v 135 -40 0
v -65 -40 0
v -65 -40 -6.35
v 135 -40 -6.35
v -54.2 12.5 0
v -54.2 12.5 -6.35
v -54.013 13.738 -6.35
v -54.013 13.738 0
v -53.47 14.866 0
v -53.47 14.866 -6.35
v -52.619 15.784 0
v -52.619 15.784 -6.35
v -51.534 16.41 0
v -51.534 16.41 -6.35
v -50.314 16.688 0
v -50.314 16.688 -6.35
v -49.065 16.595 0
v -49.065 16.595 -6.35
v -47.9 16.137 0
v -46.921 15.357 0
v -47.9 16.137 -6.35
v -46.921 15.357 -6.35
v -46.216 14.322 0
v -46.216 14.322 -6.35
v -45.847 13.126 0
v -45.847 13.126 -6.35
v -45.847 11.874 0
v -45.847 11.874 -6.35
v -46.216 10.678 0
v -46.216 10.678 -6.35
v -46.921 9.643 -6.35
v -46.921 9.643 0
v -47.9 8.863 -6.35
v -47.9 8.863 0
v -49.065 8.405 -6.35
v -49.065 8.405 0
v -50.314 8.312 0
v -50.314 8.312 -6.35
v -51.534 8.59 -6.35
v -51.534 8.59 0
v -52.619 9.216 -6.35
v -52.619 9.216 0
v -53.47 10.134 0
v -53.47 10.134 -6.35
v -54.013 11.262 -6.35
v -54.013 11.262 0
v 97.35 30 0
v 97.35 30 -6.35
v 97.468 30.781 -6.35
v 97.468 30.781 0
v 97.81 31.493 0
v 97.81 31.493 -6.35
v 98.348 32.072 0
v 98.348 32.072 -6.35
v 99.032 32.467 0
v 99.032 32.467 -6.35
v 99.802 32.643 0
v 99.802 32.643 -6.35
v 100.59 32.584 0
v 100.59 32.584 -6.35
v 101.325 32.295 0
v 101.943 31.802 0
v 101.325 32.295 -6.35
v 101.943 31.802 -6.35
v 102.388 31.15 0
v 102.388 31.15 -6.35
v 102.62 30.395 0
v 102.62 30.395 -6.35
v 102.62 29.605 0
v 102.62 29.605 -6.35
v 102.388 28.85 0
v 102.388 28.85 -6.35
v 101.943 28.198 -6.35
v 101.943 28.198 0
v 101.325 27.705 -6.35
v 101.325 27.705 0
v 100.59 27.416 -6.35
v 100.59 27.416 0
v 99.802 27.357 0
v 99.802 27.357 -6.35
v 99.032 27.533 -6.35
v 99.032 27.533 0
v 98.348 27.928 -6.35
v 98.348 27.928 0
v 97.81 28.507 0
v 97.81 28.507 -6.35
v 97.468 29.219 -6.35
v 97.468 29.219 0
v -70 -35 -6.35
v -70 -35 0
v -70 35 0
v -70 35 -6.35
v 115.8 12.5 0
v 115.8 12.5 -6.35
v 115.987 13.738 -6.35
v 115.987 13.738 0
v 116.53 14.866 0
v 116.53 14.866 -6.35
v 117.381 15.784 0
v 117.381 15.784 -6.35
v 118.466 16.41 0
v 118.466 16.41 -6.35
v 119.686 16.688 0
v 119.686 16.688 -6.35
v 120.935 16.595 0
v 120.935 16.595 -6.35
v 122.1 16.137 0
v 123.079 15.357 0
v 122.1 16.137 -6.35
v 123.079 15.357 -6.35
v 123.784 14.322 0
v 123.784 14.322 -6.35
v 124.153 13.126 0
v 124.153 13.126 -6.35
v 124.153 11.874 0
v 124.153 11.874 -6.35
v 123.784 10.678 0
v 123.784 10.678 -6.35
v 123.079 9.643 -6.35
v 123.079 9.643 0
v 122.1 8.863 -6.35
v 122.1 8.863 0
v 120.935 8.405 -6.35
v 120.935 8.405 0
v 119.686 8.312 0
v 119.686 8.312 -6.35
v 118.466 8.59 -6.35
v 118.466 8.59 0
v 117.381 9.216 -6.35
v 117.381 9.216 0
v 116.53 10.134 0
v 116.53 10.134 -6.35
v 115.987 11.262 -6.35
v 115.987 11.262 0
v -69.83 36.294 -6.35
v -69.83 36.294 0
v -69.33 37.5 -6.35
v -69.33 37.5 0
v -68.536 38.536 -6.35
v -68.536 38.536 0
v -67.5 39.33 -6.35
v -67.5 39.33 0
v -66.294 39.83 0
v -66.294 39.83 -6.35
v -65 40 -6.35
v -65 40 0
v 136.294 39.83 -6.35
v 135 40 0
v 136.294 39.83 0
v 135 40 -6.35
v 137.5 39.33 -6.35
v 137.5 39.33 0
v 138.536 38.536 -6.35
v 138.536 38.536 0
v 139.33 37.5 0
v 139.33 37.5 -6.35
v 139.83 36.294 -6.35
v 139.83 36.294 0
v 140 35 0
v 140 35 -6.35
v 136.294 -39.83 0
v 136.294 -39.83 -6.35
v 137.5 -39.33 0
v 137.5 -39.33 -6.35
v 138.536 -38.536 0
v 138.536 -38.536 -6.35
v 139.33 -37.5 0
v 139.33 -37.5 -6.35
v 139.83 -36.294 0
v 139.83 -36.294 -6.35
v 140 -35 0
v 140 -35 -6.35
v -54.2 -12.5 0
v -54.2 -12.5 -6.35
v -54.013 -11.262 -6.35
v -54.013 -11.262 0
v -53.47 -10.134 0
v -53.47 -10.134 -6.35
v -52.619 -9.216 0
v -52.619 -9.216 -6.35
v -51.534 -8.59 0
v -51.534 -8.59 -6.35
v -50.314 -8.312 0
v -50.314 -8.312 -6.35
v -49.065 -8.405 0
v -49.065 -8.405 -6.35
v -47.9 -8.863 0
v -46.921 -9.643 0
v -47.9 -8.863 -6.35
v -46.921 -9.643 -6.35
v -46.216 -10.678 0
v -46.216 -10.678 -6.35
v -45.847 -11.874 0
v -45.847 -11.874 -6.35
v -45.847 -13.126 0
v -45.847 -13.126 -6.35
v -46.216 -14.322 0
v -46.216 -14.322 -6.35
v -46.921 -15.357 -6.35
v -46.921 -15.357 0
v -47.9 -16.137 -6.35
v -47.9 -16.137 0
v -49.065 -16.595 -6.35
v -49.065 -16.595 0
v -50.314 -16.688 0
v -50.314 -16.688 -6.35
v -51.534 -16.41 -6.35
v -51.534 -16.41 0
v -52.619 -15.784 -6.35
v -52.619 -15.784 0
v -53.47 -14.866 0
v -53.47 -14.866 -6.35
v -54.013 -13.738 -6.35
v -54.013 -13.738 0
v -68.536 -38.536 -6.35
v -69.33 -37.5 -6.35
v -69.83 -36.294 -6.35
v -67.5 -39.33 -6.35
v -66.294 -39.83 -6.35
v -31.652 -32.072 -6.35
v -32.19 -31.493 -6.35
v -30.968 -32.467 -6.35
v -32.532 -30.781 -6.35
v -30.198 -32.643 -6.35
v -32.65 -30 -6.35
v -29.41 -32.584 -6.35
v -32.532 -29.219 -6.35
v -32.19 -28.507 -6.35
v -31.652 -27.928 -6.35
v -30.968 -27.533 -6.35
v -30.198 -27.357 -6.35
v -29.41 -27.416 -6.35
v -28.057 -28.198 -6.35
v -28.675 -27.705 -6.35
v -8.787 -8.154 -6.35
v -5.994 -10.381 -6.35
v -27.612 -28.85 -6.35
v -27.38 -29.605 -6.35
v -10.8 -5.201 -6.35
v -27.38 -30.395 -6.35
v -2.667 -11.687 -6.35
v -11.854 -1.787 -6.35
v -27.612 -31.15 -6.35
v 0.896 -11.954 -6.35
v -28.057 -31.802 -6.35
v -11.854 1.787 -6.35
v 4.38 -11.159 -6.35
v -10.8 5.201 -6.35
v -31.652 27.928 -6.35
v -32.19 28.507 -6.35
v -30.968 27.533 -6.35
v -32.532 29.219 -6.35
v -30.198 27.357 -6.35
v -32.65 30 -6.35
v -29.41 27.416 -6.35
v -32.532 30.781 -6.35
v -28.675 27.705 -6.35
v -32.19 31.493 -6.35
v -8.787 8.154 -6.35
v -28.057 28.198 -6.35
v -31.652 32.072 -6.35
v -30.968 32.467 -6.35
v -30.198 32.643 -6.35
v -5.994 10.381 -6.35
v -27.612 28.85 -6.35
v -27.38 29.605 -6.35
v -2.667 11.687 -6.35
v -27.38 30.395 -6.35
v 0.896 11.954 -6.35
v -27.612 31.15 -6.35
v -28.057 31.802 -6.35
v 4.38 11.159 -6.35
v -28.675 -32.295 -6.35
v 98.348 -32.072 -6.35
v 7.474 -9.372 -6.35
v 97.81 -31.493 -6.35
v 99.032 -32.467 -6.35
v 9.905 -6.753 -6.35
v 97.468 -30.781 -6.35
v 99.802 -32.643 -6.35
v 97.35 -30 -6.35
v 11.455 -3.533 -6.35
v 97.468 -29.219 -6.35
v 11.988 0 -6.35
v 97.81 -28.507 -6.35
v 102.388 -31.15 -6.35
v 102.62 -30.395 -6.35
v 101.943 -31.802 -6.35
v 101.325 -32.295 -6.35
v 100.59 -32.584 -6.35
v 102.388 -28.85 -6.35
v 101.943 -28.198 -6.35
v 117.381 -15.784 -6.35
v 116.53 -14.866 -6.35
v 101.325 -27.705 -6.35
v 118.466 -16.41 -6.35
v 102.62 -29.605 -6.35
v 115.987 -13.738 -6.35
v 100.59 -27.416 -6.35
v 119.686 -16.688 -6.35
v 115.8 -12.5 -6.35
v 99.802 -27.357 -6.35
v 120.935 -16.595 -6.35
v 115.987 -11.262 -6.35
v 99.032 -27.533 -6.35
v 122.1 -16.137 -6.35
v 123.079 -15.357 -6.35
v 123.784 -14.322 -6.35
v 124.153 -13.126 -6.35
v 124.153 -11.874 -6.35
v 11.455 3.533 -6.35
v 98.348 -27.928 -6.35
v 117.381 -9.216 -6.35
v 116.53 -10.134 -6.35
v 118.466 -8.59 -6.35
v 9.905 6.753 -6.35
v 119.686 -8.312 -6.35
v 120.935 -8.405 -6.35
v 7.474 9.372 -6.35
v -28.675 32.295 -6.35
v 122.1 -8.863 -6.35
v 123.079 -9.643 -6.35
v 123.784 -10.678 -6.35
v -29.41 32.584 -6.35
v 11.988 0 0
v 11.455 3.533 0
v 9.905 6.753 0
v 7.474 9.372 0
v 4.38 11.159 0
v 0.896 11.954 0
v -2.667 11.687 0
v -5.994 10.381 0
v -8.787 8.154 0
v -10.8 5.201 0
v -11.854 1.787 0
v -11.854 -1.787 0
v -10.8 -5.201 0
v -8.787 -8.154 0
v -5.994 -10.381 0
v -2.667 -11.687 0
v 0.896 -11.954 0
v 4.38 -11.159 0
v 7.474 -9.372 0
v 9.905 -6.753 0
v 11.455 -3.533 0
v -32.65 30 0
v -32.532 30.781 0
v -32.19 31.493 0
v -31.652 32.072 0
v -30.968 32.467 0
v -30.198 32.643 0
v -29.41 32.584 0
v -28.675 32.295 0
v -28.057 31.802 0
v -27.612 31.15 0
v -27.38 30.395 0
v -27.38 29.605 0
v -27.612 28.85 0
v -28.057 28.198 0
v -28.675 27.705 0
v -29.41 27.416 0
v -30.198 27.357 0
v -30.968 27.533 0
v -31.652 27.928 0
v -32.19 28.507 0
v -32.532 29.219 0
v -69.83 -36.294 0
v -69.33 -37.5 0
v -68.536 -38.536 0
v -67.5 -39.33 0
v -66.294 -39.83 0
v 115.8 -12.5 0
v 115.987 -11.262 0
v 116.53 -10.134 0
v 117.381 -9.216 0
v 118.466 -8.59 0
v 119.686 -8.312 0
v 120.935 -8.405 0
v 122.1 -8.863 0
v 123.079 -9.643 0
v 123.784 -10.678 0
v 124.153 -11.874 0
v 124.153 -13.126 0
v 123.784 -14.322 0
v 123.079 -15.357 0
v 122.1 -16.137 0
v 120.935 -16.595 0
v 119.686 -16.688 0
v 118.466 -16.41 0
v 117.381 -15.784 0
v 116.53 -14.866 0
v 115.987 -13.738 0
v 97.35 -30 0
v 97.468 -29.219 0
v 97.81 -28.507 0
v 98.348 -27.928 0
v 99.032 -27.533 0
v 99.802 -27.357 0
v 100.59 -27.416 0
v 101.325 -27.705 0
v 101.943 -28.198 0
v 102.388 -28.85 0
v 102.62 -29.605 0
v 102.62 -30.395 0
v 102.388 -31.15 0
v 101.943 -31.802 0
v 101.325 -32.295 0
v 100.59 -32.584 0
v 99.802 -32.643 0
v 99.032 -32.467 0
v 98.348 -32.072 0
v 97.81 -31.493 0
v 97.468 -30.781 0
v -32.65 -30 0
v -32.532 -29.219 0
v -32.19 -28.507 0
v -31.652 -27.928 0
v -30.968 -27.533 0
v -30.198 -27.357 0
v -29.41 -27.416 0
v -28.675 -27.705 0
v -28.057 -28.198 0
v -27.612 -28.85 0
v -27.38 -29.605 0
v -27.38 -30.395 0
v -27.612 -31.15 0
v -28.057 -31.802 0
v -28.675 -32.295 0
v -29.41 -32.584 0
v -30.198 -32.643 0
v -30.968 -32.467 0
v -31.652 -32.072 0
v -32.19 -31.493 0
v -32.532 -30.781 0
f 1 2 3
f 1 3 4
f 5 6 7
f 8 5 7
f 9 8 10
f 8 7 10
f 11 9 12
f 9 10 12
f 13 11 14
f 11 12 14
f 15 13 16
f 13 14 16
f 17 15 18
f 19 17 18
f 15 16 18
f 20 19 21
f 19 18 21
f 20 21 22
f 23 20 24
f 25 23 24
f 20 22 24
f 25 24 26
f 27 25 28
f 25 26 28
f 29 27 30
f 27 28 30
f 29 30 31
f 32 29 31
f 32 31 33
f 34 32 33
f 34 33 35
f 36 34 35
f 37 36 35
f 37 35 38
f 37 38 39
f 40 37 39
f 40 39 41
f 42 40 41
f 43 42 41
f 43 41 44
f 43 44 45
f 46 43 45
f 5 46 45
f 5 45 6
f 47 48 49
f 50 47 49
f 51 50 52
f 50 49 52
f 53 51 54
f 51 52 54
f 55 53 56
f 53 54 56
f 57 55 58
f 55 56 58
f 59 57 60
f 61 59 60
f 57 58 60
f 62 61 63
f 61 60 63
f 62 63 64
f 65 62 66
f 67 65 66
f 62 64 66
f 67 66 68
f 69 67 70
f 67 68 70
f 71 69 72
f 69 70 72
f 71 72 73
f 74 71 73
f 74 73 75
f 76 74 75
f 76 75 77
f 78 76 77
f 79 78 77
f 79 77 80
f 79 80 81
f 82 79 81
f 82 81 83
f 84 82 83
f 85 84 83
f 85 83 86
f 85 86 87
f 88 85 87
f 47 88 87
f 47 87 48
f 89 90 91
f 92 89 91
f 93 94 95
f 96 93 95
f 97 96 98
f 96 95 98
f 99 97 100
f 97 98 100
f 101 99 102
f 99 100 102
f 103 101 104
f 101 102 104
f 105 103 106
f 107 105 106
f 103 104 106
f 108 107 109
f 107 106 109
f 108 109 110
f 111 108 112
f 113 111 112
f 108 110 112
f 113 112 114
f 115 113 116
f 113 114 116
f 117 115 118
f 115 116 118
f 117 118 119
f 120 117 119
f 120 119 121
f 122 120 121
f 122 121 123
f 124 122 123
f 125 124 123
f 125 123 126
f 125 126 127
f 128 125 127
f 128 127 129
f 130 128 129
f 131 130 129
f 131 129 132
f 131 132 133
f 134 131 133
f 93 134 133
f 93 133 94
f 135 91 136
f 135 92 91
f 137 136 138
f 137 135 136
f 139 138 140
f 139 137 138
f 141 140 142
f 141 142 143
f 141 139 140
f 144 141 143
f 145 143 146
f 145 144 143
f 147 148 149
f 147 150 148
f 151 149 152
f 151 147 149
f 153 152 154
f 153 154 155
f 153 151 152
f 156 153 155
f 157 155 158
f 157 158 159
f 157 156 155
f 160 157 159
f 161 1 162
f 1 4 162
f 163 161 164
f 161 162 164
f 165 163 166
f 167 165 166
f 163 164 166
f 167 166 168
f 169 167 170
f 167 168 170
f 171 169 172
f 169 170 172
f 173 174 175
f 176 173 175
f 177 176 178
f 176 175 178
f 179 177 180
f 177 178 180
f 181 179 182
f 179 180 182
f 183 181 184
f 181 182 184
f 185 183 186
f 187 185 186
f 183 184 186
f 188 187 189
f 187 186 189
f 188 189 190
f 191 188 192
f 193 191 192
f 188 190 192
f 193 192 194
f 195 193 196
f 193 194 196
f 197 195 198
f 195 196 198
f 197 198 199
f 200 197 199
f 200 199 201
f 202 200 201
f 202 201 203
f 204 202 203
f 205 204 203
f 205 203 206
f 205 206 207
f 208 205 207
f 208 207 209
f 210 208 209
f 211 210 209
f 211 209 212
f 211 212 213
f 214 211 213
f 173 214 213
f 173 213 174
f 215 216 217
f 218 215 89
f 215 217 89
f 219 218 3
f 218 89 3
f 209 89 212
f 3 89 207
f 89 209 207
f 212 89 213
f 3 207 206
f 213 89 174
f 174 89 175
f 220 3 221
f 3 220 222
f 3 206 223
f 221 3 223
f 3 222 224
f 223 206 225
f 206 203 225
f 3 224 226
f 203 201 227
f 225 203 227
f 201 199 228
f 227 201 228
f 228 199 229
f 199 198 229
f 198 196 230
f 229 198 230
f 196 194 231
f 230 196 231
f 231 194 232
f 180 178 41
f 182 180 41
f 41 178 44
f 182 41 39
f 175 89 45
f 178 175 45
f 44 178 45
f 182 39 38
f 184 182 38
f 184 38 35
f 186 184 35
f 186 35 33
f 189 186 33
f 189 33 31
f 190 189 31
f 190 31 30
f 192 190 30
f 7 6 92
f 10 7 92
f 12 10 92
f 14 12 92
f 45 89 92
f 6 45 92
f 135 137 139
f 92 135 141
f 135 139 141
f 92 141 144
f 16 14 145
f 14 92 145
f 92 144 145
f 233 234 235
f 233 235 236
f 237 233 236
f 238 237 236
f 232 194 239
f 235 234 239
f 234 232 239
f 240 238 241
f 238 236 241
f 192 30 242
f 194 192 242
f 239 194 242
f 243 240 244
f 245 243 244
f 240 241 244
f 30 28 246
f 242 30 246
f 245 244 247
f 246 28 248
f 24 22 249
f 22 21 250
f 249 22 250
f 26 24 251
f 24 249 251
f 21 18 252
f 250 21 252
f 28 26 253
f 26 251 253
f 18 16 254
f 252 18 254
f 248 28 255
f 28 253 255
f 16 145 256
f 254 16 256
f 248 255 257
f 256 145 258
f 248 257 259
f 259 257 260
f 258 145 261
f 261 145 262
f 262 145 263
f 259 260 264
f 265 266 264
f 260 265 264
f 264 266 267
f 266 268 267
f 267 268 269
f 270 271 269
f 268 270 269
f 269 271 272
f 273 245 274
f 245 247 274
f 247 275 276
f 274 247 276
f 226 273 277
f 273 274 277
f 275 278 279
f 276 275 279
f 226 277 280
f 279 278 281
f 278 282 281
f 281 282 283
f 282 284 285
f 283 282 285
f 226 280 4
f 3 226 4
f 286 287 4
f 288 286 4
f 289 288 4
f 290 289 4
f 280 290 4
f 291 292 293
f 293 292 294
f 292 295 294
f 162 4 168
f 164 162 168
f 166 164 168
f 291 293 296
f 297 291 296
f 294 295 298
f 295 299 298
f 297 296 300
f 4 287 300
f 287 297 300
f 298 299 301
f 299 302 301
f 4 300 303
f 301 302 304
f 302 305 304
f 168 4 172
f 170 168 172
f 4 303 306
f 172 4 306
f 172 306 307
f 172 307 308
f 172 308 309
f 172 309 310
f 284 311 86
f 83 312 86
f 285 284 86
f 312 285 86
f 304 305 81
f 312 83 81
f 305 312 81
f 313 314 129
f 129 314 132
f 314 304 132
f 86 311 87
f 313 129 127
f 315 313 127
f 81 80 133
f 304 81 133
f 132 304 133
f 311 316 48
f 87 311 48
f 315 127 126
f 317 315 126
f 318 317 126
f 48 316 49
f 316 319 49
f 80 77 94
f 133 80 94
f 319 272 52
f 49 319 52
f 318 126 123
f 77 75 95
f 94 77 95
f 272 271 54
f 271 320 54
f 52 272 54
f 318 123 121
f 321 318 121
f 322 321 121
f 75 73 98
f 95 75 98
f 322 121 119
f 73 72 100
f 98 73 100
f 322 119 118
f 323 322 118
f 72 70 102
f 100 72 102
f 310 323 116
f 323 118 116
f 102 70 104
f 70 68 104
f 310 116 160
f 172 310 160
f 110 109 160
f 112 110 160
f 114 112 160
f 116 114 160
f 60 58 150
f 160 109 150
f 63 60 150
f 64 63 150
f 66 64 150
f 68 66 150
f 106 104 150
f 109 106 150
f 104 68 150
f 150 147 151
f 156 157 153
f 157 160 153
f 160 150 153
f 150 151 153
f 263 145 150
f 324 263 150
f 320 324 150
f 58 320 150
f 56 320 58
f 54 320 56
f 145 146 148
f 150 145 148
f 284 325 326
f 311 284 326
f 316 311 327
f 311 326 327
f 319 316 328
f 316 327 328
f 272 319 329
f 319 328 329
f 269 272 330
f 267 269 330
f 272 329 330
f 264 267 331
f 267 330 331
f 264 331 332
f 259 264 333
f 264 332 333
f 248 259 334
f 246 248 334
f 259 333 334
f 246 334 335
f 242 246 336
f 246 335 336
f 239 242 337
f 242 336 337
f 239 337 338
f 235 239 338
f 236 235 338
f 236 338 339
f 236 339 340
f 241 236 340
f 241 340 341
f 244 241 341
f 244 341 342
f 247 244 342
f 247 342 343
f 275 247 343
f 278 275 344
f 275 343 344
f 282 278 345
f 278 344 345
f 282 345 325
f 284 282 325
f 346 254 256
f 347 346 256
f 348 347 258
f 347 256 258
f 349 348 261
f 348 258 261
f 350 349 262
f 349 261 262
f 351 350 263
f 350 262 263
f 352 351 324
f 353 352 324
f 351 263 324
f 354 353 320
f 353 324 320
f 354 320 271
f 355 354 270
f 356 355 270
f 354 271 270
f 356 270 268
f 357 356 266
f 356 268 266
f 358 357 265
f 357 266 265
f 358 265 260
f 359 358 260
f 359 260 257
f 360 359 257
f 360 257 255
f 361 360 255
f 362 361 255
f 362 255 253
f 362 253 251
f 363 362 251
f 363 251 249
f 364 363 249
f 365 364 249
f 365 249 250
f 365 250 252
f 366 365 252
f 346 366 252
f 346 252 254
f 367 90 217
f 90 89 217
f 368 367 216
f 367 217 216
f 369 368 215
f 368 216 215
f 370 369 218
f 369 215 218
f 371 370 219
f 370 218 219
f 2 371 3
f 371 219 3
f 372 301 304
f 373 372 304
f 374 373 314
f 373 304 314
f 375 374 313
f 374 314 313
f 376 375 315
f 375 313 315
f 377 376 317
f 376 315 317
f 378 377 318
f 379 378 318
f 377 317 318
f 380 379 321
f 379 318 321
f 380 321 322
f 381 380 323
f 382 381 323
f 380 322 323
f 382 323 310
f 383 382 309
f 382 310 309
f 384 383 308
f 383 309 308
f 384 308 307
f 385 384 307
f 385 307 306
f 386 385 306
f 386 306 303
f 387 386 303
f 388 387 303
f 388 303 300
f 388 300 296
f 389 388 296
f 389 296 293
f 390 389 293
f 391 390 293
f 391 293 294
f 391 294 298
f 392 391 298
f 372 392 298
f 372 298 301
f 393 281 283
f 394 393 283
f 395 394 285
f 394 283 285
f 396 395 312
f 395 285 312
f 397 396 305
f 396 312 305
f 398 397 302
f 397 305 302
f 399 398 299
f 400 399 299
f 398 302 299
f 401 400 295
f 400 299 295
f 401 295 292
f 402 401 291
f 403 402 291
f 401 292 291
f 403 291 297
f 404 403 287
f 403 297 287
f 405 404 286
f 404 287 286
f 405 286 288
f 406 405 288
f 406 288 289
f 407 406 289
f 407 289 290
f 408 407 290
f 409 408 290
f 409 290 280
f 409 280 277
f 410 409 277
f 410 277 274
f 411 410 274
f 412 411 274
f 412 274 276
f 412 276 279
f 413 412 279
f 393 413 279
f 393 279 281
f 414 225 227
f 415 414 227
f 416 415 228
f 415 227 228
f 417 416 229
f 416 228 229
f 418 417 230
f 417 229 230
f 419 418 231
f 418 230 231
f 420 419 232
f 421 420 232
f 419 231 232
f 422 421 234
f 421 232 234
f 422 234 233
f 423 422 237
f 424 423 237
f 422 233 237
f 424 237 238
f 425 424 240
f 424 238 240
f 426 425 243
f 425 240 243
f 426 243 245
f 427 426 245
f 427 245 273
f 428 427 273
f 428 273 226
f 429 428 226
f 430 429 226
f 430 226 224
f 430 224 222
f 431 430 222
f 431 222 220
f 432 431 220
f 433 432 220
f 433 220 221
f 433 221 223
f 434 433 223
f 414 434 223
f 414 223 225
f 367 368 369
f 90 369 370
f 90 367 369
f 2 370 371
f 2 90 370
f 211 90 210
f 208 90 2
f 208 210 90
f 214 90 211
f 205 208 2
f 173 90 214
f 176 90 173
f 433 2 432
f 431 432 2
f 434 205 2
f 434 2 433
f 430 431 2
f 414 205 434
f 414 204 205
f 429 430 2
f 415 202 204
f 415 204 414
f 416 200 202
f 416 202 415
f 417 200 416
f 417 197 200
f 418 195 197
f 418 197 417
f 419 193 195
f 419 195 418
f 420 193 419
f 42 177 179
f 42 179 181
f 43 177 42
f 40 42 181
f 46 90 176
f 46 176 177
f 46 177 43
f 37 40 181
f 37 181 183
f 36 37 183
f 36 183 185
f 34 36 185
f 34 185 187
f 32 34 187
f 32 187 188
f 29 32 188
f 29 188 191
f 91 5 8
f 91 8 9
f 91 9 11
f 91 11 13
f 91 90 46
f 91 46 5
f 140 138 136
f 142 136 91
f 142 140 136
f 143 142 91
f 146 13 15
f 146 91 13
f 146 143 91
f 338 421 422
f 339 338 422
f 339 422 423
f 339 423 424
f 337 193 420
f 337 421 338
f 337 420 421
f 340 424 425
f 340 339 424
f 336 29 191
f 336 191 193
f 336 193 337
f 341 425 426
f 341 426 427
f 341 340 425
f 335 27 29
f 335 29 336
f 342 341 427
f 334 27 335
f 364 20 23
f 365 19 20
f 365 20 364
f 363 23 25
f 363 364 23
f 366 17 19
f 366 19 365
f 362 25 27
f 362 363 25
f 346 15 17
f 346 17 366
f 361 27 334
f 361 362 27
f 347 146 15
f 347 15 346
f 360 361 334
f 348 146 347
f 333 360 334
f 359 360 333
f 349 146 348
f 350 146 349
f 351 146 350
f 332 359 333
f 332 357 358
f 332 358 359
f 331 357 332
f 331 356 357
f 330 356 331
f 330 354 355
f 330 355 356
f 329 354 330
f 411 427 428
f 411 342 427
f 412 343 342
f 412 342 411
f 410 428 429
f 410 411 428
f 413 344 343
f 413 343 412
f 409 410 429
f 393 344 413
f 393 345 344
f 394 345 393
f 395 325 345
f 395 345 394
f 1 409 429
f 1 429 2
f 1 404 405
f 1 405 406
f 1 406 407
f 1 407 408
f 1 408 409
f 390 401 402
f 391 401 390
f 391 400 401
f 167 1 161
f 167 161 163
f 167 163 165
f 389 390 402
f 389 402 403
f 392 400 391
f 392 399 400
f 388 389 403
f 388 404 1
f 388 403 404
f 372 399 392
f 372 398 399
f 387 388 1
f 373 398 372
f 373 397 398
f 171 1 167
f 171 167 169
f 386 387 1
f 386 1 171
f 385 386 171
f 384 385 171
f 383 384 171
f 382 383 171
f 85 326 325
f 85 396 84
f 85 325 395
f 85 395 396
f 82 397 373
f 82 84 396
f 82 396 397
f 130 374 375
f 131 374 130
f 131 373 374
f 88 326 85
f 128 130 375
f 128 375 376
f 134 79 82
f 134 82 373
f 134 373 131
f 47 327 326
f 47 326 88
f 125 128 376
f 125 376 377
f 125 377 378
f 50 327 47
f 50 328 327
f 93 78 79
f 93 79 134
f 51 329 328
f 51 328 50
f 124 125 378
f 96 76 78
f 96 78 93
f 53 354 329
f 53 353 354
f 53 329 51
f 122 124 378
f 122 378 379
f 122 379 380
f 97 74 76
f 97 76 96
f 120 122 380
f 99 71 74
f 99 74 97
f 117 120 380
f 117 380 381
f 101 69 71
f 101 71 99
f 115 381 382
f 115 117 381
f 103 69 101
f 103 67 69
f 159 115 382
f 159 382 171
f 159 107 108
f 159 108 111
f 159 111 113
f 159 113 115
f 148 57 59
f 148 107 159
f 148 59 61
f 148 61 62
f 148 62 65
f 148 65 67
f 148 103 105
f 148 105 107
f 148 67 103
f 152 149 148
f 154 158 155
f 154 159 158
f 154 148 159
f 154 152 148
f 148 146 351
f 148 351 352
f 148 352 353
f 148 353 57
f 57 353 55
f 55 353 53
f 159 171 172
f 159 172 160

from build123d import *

# Parameters (mm, degrees)
SKETCH1_W            = 210
SKETCH1_H            = 80
SKETCH1_R            = 11.9875
BOSS_EXTRUDE1_DEPTH  = 6.35
M5_CLEARANCE_HOLE1_D = 5.3
FILLET1_R            = 5
M8_CLEARANCE_HOLE2_D = 8.4


with BuildPart() as part:
    # Sketch1 → Boss-Extrude1 (new body)
    with BuildSketch(Plane.XY):
        with Locations((35, 0)):
            Rectangle(SKETCH1_W, SKETCH1_H)
        Circle(SKETCH1_R, mode=Mode.SUBTRACT)
    extrude(amount=-BOSS_EXTRUDE1_DEPTH)

    # M5 Clearance Hole1 (through all)
    with Locations(Plane(origin=(-30, 30, 0), x_dir=(1, 0, 0), z_dir=(0, 0, 1))):
        with Locations((0, 0), (0, -60), (130, -60), (130, 0)):
            Hole(M5_CLEARANCE_HOLE1_D / 2)

    # Fillet1
    fillet1_edges = [part.edges().sort_by_distance(p)[0] for p in [
        (-70, 40, -3.175),
        (140, 40, -3.175),
        (140, -40, -3.175),
        (-70, -40, -3.175),
    ]]
    fillet(fillet1_edges, radius=FILLET1_R)

    # M8 Clearance Hole2 (through all)
    with Locations(Plane(origin=(-50, 12.5, 0), x_dir=(1, 0, 0), z_dir=(0, 0, 1))):
        with Locations((0, 0), (0, -25), (170, -25), (170, 0)):
            Hole(M8_CLEARANCE_HOLE2_D / 2)


solid = part.part
